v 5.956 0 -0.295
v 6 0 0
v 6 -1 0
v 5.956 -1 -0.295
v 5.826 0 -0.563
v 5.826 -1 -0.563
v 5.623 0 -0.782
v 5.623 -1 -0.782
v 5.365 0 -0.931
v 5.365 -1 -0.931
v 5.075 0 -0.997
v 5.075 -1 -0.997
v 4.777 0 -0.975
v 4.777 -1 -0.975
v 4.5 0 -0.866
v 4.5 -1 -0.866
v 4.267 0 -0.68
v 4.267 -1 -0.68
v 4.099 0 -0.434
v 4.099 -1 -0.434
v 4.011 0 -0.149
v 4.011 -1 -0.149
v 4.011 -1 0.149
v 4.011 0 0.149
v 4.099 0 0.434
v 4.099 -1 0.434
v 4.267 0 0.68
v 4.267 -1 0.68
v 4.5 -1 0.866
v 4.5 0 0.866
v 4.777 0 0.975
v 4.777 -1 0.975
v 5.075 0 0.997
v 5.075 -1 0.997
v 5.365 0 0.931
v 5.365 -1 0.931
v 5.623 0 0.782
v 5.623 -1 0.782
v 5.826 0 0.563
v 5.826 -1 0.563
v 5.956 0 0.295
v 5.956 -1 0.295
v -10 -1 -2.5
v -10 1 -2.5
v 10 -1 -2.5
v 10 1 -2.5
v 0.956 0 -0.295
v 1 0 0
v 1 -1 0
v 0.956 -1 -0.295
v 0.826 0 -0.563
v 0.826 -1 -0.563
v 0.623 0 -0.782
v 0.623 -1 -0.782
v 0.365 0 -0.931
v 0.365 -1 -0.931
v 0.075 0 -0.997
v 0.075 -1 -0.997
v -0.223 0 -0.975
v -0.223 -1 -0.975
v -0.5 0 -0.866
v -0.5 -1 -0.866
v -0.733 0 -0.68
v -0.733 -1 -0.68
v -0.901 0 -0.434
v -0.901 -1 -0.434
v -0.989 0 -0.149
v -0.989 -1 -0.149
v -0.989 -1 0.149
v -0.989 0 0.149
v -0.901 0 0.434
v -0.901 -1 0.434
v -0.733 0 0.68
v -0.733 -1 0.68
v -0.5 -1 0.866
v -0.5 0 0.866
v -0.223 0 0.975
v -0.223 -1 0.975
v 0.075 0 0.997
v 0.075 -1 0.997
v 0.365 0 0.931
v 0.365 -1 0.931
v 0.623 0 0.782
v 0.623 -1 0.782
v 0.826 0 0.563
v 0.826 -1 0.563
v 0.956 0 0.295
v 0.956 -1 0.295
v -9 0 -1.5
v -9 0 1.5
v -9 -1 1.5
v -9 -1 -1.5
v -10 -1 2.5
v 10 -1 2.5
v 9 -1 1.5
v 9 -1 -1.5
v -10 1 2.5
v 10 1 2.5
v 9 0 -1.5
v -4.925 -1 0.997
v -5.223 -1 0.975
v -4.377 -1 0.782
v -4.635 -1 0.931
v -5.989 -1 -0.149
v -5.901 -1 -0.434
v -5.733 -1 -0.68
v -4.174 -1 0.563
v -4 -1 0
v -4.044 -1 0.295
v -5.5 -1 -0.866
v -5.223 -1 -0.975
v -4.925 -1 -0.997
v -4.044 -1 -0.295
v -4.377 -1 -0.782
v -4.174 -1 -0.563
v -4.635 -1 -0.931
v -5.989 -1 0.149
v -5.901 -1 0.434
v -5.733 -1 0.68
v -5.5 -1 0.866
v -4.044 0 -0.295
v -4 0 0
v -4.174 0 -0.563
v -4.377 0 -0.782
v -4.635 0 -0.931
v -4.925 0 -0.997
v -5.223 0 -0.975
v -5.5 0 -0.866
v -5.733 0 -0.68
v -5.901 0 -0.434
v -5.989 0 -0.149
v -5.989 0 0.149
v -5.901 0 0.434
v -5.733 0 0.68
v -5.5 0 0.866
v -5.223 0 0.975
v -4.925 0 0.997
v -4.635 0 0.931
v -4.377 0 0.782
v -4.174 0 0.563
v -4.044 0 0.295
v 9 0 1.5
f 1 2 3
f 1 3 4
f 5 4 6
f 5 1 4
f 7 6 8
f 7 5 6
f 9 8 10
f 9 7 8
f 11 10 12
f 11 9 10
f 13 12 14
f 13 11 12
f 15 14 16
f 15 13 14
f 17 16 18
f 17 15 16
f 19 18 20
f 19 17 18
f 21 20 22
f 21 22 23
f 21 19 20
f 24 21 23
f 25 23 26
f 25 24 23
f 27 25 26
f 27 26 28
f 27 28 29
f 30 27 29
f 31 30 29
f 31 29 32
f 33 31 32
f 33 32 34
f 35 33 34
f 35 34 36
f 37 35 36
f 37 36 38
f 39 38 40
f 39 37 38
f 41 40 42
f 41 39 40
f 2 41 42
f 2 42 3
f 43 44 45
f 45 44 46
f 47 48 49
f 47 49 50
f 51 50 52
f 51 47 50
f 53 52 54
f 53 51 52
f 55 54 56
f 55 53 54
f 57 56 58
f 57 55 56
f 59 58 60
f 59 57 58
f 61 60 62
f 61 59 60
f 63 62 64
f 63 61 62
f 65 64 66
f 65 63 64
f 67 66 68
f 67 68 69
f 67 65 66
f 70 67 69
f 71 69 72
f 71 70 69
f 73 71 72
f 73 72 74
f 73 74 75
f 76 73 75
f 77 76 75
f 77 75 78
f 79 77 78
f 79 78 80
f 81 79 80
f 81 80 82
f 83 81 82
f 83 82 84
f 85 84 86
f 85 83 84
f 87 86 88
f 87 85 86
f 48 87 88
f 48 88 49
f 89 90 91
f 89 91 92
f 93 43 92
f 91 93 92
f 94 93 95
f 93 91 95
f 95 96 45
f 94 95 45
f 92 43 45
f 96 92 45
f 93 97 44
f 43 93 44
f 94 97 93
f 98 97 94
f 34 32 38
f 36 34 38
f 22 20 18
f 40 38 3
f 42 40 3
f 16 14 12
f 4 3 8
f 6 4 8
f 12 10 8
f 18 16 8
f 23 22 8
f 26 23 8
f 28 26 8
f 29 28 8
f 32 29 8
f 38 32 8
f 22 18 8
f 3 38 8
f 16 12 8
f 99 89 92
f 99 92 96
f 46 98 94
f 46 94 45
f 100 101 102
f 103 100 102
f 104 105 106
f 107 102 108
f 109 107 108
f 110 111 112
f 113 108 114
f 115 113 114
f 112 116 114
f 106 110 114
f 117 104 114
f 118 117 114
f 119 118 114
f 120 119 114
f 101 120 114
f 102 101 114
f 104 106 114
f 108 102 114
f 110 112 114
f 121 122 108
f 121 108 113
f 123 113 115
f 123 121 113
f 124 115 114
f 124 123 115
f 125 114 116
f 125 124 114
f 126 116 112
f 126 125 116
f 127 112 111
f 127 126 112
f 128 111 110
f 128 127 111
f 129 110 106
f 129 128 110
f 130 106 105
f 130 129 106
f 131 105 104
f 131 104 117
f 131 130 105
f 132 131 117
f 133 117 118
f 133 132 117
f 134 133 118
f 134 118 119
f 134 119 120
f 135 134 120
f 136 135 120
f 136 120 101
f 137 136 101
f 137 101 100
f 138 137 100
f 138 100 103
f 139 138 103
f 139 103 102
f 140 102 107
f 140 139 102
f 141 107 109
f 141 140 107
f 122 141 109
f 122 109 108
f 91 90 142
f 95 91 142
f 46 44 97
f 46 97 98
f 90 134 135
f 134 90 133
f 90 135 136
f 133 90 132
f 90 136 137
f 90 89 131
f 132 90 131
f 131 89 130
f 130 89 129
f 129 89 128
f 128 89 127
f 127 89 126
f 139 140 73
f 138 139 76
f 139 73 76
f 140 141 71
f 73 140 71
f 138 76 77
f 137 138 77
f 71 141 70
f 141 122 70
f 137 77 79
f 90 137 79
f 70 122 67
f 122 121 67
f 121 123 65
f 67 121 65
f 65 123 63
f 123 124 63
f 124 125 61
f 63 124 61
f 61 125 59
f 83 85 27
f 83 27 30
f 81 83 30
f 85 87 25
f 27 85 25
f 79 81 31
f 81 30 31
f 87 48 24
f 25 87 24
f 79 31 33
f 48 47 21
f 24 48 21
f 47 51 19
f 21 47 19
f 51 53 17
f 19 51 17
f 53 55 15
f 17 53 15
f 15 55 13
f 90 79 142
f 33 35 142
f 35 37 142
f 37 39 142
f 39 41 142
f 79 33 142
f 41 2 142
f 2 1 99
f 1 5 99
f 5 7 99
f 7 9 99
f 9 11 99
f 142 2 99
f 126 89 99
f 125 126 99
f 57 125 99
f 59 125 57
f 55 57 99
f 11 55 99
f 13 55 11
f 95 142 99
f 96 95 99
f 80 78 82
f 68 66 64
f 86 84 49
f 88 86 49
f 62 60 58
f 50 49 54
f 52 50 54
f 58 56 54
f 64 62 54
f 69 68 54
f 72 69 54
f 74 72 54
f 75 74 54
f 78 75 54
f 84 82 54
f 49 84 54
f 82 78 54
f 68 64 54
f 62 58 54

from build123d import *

# Parameters (mm, degrees)
SKETCH1_W           = 20
SKETCH1_H           = 5
BOSS_EXTRUDE1_DEPTH = 1
SKETCH1_3_W         = 20
SKETCH1_3_H         = 5
SKETCH1_3_W_2       = 18
SKETCH1_3_H_2       = 3
SKETCH1_3_R         = 1
BOSS_EXTRUDE2_DEPTH = 1


with BuildPart() as part:
    # Sketch1 → Boss-Extrude1 (new body)
    with BuildSketch(Plane(origin=(0, 0, 0), x_dir=(1, 0, 0), z_dir=(0, 1, 0))):
        Rectangle(SKETCH1_W, SKETCH1_H)
    extrude(amount=BOSS_EXTRUDE1_DEPTH)

    # Sketch1<3> → Boss-Extrude2 (add)
    # profile 1 of 4: a face of its own
    with BuildSketch(Plane(origin=(0, 0, 0), x_dir=(1, 0, 0), z_dir=(0, 1, 0))):
        Rectangle(SKETCH1_3_W, SKETCH1_3_H)
        Rectangle(SKETCH1_3_W_2, SKETCH1_3_H_2, mode=Mode.SUBTRACT)
    # profile 2 of 4: a face of its own
    with BuildSketch(Plane(origin=(0, 0, 0), x_dir=(1, 0, 0), z_dir=(0, 1, 0))):
        with Locations((-5, 0)):
            Circle(SKETCH1_3_R)
    # profile 3 of 4: a face of its own
    with BuildSketch(Plane(origin=(0, 0, 0), x_dir=(1, 0, 0), z_dir=(0, 1, 0))):
        Circle(SKETCH1_3_R)
    # profile 4 of 4: a face of its own
    with BuildSketch(Plane(origin=(0, 0, 0), x_dir=(1, 0, 0), z_dir=(0, 1, 0))):
        with Locations((5, 0)):
            Circle(SKETCH1_3_R)
    extrude(amount=-BOSS_EXTRUDE2_DEPTH)


solid = part.part
